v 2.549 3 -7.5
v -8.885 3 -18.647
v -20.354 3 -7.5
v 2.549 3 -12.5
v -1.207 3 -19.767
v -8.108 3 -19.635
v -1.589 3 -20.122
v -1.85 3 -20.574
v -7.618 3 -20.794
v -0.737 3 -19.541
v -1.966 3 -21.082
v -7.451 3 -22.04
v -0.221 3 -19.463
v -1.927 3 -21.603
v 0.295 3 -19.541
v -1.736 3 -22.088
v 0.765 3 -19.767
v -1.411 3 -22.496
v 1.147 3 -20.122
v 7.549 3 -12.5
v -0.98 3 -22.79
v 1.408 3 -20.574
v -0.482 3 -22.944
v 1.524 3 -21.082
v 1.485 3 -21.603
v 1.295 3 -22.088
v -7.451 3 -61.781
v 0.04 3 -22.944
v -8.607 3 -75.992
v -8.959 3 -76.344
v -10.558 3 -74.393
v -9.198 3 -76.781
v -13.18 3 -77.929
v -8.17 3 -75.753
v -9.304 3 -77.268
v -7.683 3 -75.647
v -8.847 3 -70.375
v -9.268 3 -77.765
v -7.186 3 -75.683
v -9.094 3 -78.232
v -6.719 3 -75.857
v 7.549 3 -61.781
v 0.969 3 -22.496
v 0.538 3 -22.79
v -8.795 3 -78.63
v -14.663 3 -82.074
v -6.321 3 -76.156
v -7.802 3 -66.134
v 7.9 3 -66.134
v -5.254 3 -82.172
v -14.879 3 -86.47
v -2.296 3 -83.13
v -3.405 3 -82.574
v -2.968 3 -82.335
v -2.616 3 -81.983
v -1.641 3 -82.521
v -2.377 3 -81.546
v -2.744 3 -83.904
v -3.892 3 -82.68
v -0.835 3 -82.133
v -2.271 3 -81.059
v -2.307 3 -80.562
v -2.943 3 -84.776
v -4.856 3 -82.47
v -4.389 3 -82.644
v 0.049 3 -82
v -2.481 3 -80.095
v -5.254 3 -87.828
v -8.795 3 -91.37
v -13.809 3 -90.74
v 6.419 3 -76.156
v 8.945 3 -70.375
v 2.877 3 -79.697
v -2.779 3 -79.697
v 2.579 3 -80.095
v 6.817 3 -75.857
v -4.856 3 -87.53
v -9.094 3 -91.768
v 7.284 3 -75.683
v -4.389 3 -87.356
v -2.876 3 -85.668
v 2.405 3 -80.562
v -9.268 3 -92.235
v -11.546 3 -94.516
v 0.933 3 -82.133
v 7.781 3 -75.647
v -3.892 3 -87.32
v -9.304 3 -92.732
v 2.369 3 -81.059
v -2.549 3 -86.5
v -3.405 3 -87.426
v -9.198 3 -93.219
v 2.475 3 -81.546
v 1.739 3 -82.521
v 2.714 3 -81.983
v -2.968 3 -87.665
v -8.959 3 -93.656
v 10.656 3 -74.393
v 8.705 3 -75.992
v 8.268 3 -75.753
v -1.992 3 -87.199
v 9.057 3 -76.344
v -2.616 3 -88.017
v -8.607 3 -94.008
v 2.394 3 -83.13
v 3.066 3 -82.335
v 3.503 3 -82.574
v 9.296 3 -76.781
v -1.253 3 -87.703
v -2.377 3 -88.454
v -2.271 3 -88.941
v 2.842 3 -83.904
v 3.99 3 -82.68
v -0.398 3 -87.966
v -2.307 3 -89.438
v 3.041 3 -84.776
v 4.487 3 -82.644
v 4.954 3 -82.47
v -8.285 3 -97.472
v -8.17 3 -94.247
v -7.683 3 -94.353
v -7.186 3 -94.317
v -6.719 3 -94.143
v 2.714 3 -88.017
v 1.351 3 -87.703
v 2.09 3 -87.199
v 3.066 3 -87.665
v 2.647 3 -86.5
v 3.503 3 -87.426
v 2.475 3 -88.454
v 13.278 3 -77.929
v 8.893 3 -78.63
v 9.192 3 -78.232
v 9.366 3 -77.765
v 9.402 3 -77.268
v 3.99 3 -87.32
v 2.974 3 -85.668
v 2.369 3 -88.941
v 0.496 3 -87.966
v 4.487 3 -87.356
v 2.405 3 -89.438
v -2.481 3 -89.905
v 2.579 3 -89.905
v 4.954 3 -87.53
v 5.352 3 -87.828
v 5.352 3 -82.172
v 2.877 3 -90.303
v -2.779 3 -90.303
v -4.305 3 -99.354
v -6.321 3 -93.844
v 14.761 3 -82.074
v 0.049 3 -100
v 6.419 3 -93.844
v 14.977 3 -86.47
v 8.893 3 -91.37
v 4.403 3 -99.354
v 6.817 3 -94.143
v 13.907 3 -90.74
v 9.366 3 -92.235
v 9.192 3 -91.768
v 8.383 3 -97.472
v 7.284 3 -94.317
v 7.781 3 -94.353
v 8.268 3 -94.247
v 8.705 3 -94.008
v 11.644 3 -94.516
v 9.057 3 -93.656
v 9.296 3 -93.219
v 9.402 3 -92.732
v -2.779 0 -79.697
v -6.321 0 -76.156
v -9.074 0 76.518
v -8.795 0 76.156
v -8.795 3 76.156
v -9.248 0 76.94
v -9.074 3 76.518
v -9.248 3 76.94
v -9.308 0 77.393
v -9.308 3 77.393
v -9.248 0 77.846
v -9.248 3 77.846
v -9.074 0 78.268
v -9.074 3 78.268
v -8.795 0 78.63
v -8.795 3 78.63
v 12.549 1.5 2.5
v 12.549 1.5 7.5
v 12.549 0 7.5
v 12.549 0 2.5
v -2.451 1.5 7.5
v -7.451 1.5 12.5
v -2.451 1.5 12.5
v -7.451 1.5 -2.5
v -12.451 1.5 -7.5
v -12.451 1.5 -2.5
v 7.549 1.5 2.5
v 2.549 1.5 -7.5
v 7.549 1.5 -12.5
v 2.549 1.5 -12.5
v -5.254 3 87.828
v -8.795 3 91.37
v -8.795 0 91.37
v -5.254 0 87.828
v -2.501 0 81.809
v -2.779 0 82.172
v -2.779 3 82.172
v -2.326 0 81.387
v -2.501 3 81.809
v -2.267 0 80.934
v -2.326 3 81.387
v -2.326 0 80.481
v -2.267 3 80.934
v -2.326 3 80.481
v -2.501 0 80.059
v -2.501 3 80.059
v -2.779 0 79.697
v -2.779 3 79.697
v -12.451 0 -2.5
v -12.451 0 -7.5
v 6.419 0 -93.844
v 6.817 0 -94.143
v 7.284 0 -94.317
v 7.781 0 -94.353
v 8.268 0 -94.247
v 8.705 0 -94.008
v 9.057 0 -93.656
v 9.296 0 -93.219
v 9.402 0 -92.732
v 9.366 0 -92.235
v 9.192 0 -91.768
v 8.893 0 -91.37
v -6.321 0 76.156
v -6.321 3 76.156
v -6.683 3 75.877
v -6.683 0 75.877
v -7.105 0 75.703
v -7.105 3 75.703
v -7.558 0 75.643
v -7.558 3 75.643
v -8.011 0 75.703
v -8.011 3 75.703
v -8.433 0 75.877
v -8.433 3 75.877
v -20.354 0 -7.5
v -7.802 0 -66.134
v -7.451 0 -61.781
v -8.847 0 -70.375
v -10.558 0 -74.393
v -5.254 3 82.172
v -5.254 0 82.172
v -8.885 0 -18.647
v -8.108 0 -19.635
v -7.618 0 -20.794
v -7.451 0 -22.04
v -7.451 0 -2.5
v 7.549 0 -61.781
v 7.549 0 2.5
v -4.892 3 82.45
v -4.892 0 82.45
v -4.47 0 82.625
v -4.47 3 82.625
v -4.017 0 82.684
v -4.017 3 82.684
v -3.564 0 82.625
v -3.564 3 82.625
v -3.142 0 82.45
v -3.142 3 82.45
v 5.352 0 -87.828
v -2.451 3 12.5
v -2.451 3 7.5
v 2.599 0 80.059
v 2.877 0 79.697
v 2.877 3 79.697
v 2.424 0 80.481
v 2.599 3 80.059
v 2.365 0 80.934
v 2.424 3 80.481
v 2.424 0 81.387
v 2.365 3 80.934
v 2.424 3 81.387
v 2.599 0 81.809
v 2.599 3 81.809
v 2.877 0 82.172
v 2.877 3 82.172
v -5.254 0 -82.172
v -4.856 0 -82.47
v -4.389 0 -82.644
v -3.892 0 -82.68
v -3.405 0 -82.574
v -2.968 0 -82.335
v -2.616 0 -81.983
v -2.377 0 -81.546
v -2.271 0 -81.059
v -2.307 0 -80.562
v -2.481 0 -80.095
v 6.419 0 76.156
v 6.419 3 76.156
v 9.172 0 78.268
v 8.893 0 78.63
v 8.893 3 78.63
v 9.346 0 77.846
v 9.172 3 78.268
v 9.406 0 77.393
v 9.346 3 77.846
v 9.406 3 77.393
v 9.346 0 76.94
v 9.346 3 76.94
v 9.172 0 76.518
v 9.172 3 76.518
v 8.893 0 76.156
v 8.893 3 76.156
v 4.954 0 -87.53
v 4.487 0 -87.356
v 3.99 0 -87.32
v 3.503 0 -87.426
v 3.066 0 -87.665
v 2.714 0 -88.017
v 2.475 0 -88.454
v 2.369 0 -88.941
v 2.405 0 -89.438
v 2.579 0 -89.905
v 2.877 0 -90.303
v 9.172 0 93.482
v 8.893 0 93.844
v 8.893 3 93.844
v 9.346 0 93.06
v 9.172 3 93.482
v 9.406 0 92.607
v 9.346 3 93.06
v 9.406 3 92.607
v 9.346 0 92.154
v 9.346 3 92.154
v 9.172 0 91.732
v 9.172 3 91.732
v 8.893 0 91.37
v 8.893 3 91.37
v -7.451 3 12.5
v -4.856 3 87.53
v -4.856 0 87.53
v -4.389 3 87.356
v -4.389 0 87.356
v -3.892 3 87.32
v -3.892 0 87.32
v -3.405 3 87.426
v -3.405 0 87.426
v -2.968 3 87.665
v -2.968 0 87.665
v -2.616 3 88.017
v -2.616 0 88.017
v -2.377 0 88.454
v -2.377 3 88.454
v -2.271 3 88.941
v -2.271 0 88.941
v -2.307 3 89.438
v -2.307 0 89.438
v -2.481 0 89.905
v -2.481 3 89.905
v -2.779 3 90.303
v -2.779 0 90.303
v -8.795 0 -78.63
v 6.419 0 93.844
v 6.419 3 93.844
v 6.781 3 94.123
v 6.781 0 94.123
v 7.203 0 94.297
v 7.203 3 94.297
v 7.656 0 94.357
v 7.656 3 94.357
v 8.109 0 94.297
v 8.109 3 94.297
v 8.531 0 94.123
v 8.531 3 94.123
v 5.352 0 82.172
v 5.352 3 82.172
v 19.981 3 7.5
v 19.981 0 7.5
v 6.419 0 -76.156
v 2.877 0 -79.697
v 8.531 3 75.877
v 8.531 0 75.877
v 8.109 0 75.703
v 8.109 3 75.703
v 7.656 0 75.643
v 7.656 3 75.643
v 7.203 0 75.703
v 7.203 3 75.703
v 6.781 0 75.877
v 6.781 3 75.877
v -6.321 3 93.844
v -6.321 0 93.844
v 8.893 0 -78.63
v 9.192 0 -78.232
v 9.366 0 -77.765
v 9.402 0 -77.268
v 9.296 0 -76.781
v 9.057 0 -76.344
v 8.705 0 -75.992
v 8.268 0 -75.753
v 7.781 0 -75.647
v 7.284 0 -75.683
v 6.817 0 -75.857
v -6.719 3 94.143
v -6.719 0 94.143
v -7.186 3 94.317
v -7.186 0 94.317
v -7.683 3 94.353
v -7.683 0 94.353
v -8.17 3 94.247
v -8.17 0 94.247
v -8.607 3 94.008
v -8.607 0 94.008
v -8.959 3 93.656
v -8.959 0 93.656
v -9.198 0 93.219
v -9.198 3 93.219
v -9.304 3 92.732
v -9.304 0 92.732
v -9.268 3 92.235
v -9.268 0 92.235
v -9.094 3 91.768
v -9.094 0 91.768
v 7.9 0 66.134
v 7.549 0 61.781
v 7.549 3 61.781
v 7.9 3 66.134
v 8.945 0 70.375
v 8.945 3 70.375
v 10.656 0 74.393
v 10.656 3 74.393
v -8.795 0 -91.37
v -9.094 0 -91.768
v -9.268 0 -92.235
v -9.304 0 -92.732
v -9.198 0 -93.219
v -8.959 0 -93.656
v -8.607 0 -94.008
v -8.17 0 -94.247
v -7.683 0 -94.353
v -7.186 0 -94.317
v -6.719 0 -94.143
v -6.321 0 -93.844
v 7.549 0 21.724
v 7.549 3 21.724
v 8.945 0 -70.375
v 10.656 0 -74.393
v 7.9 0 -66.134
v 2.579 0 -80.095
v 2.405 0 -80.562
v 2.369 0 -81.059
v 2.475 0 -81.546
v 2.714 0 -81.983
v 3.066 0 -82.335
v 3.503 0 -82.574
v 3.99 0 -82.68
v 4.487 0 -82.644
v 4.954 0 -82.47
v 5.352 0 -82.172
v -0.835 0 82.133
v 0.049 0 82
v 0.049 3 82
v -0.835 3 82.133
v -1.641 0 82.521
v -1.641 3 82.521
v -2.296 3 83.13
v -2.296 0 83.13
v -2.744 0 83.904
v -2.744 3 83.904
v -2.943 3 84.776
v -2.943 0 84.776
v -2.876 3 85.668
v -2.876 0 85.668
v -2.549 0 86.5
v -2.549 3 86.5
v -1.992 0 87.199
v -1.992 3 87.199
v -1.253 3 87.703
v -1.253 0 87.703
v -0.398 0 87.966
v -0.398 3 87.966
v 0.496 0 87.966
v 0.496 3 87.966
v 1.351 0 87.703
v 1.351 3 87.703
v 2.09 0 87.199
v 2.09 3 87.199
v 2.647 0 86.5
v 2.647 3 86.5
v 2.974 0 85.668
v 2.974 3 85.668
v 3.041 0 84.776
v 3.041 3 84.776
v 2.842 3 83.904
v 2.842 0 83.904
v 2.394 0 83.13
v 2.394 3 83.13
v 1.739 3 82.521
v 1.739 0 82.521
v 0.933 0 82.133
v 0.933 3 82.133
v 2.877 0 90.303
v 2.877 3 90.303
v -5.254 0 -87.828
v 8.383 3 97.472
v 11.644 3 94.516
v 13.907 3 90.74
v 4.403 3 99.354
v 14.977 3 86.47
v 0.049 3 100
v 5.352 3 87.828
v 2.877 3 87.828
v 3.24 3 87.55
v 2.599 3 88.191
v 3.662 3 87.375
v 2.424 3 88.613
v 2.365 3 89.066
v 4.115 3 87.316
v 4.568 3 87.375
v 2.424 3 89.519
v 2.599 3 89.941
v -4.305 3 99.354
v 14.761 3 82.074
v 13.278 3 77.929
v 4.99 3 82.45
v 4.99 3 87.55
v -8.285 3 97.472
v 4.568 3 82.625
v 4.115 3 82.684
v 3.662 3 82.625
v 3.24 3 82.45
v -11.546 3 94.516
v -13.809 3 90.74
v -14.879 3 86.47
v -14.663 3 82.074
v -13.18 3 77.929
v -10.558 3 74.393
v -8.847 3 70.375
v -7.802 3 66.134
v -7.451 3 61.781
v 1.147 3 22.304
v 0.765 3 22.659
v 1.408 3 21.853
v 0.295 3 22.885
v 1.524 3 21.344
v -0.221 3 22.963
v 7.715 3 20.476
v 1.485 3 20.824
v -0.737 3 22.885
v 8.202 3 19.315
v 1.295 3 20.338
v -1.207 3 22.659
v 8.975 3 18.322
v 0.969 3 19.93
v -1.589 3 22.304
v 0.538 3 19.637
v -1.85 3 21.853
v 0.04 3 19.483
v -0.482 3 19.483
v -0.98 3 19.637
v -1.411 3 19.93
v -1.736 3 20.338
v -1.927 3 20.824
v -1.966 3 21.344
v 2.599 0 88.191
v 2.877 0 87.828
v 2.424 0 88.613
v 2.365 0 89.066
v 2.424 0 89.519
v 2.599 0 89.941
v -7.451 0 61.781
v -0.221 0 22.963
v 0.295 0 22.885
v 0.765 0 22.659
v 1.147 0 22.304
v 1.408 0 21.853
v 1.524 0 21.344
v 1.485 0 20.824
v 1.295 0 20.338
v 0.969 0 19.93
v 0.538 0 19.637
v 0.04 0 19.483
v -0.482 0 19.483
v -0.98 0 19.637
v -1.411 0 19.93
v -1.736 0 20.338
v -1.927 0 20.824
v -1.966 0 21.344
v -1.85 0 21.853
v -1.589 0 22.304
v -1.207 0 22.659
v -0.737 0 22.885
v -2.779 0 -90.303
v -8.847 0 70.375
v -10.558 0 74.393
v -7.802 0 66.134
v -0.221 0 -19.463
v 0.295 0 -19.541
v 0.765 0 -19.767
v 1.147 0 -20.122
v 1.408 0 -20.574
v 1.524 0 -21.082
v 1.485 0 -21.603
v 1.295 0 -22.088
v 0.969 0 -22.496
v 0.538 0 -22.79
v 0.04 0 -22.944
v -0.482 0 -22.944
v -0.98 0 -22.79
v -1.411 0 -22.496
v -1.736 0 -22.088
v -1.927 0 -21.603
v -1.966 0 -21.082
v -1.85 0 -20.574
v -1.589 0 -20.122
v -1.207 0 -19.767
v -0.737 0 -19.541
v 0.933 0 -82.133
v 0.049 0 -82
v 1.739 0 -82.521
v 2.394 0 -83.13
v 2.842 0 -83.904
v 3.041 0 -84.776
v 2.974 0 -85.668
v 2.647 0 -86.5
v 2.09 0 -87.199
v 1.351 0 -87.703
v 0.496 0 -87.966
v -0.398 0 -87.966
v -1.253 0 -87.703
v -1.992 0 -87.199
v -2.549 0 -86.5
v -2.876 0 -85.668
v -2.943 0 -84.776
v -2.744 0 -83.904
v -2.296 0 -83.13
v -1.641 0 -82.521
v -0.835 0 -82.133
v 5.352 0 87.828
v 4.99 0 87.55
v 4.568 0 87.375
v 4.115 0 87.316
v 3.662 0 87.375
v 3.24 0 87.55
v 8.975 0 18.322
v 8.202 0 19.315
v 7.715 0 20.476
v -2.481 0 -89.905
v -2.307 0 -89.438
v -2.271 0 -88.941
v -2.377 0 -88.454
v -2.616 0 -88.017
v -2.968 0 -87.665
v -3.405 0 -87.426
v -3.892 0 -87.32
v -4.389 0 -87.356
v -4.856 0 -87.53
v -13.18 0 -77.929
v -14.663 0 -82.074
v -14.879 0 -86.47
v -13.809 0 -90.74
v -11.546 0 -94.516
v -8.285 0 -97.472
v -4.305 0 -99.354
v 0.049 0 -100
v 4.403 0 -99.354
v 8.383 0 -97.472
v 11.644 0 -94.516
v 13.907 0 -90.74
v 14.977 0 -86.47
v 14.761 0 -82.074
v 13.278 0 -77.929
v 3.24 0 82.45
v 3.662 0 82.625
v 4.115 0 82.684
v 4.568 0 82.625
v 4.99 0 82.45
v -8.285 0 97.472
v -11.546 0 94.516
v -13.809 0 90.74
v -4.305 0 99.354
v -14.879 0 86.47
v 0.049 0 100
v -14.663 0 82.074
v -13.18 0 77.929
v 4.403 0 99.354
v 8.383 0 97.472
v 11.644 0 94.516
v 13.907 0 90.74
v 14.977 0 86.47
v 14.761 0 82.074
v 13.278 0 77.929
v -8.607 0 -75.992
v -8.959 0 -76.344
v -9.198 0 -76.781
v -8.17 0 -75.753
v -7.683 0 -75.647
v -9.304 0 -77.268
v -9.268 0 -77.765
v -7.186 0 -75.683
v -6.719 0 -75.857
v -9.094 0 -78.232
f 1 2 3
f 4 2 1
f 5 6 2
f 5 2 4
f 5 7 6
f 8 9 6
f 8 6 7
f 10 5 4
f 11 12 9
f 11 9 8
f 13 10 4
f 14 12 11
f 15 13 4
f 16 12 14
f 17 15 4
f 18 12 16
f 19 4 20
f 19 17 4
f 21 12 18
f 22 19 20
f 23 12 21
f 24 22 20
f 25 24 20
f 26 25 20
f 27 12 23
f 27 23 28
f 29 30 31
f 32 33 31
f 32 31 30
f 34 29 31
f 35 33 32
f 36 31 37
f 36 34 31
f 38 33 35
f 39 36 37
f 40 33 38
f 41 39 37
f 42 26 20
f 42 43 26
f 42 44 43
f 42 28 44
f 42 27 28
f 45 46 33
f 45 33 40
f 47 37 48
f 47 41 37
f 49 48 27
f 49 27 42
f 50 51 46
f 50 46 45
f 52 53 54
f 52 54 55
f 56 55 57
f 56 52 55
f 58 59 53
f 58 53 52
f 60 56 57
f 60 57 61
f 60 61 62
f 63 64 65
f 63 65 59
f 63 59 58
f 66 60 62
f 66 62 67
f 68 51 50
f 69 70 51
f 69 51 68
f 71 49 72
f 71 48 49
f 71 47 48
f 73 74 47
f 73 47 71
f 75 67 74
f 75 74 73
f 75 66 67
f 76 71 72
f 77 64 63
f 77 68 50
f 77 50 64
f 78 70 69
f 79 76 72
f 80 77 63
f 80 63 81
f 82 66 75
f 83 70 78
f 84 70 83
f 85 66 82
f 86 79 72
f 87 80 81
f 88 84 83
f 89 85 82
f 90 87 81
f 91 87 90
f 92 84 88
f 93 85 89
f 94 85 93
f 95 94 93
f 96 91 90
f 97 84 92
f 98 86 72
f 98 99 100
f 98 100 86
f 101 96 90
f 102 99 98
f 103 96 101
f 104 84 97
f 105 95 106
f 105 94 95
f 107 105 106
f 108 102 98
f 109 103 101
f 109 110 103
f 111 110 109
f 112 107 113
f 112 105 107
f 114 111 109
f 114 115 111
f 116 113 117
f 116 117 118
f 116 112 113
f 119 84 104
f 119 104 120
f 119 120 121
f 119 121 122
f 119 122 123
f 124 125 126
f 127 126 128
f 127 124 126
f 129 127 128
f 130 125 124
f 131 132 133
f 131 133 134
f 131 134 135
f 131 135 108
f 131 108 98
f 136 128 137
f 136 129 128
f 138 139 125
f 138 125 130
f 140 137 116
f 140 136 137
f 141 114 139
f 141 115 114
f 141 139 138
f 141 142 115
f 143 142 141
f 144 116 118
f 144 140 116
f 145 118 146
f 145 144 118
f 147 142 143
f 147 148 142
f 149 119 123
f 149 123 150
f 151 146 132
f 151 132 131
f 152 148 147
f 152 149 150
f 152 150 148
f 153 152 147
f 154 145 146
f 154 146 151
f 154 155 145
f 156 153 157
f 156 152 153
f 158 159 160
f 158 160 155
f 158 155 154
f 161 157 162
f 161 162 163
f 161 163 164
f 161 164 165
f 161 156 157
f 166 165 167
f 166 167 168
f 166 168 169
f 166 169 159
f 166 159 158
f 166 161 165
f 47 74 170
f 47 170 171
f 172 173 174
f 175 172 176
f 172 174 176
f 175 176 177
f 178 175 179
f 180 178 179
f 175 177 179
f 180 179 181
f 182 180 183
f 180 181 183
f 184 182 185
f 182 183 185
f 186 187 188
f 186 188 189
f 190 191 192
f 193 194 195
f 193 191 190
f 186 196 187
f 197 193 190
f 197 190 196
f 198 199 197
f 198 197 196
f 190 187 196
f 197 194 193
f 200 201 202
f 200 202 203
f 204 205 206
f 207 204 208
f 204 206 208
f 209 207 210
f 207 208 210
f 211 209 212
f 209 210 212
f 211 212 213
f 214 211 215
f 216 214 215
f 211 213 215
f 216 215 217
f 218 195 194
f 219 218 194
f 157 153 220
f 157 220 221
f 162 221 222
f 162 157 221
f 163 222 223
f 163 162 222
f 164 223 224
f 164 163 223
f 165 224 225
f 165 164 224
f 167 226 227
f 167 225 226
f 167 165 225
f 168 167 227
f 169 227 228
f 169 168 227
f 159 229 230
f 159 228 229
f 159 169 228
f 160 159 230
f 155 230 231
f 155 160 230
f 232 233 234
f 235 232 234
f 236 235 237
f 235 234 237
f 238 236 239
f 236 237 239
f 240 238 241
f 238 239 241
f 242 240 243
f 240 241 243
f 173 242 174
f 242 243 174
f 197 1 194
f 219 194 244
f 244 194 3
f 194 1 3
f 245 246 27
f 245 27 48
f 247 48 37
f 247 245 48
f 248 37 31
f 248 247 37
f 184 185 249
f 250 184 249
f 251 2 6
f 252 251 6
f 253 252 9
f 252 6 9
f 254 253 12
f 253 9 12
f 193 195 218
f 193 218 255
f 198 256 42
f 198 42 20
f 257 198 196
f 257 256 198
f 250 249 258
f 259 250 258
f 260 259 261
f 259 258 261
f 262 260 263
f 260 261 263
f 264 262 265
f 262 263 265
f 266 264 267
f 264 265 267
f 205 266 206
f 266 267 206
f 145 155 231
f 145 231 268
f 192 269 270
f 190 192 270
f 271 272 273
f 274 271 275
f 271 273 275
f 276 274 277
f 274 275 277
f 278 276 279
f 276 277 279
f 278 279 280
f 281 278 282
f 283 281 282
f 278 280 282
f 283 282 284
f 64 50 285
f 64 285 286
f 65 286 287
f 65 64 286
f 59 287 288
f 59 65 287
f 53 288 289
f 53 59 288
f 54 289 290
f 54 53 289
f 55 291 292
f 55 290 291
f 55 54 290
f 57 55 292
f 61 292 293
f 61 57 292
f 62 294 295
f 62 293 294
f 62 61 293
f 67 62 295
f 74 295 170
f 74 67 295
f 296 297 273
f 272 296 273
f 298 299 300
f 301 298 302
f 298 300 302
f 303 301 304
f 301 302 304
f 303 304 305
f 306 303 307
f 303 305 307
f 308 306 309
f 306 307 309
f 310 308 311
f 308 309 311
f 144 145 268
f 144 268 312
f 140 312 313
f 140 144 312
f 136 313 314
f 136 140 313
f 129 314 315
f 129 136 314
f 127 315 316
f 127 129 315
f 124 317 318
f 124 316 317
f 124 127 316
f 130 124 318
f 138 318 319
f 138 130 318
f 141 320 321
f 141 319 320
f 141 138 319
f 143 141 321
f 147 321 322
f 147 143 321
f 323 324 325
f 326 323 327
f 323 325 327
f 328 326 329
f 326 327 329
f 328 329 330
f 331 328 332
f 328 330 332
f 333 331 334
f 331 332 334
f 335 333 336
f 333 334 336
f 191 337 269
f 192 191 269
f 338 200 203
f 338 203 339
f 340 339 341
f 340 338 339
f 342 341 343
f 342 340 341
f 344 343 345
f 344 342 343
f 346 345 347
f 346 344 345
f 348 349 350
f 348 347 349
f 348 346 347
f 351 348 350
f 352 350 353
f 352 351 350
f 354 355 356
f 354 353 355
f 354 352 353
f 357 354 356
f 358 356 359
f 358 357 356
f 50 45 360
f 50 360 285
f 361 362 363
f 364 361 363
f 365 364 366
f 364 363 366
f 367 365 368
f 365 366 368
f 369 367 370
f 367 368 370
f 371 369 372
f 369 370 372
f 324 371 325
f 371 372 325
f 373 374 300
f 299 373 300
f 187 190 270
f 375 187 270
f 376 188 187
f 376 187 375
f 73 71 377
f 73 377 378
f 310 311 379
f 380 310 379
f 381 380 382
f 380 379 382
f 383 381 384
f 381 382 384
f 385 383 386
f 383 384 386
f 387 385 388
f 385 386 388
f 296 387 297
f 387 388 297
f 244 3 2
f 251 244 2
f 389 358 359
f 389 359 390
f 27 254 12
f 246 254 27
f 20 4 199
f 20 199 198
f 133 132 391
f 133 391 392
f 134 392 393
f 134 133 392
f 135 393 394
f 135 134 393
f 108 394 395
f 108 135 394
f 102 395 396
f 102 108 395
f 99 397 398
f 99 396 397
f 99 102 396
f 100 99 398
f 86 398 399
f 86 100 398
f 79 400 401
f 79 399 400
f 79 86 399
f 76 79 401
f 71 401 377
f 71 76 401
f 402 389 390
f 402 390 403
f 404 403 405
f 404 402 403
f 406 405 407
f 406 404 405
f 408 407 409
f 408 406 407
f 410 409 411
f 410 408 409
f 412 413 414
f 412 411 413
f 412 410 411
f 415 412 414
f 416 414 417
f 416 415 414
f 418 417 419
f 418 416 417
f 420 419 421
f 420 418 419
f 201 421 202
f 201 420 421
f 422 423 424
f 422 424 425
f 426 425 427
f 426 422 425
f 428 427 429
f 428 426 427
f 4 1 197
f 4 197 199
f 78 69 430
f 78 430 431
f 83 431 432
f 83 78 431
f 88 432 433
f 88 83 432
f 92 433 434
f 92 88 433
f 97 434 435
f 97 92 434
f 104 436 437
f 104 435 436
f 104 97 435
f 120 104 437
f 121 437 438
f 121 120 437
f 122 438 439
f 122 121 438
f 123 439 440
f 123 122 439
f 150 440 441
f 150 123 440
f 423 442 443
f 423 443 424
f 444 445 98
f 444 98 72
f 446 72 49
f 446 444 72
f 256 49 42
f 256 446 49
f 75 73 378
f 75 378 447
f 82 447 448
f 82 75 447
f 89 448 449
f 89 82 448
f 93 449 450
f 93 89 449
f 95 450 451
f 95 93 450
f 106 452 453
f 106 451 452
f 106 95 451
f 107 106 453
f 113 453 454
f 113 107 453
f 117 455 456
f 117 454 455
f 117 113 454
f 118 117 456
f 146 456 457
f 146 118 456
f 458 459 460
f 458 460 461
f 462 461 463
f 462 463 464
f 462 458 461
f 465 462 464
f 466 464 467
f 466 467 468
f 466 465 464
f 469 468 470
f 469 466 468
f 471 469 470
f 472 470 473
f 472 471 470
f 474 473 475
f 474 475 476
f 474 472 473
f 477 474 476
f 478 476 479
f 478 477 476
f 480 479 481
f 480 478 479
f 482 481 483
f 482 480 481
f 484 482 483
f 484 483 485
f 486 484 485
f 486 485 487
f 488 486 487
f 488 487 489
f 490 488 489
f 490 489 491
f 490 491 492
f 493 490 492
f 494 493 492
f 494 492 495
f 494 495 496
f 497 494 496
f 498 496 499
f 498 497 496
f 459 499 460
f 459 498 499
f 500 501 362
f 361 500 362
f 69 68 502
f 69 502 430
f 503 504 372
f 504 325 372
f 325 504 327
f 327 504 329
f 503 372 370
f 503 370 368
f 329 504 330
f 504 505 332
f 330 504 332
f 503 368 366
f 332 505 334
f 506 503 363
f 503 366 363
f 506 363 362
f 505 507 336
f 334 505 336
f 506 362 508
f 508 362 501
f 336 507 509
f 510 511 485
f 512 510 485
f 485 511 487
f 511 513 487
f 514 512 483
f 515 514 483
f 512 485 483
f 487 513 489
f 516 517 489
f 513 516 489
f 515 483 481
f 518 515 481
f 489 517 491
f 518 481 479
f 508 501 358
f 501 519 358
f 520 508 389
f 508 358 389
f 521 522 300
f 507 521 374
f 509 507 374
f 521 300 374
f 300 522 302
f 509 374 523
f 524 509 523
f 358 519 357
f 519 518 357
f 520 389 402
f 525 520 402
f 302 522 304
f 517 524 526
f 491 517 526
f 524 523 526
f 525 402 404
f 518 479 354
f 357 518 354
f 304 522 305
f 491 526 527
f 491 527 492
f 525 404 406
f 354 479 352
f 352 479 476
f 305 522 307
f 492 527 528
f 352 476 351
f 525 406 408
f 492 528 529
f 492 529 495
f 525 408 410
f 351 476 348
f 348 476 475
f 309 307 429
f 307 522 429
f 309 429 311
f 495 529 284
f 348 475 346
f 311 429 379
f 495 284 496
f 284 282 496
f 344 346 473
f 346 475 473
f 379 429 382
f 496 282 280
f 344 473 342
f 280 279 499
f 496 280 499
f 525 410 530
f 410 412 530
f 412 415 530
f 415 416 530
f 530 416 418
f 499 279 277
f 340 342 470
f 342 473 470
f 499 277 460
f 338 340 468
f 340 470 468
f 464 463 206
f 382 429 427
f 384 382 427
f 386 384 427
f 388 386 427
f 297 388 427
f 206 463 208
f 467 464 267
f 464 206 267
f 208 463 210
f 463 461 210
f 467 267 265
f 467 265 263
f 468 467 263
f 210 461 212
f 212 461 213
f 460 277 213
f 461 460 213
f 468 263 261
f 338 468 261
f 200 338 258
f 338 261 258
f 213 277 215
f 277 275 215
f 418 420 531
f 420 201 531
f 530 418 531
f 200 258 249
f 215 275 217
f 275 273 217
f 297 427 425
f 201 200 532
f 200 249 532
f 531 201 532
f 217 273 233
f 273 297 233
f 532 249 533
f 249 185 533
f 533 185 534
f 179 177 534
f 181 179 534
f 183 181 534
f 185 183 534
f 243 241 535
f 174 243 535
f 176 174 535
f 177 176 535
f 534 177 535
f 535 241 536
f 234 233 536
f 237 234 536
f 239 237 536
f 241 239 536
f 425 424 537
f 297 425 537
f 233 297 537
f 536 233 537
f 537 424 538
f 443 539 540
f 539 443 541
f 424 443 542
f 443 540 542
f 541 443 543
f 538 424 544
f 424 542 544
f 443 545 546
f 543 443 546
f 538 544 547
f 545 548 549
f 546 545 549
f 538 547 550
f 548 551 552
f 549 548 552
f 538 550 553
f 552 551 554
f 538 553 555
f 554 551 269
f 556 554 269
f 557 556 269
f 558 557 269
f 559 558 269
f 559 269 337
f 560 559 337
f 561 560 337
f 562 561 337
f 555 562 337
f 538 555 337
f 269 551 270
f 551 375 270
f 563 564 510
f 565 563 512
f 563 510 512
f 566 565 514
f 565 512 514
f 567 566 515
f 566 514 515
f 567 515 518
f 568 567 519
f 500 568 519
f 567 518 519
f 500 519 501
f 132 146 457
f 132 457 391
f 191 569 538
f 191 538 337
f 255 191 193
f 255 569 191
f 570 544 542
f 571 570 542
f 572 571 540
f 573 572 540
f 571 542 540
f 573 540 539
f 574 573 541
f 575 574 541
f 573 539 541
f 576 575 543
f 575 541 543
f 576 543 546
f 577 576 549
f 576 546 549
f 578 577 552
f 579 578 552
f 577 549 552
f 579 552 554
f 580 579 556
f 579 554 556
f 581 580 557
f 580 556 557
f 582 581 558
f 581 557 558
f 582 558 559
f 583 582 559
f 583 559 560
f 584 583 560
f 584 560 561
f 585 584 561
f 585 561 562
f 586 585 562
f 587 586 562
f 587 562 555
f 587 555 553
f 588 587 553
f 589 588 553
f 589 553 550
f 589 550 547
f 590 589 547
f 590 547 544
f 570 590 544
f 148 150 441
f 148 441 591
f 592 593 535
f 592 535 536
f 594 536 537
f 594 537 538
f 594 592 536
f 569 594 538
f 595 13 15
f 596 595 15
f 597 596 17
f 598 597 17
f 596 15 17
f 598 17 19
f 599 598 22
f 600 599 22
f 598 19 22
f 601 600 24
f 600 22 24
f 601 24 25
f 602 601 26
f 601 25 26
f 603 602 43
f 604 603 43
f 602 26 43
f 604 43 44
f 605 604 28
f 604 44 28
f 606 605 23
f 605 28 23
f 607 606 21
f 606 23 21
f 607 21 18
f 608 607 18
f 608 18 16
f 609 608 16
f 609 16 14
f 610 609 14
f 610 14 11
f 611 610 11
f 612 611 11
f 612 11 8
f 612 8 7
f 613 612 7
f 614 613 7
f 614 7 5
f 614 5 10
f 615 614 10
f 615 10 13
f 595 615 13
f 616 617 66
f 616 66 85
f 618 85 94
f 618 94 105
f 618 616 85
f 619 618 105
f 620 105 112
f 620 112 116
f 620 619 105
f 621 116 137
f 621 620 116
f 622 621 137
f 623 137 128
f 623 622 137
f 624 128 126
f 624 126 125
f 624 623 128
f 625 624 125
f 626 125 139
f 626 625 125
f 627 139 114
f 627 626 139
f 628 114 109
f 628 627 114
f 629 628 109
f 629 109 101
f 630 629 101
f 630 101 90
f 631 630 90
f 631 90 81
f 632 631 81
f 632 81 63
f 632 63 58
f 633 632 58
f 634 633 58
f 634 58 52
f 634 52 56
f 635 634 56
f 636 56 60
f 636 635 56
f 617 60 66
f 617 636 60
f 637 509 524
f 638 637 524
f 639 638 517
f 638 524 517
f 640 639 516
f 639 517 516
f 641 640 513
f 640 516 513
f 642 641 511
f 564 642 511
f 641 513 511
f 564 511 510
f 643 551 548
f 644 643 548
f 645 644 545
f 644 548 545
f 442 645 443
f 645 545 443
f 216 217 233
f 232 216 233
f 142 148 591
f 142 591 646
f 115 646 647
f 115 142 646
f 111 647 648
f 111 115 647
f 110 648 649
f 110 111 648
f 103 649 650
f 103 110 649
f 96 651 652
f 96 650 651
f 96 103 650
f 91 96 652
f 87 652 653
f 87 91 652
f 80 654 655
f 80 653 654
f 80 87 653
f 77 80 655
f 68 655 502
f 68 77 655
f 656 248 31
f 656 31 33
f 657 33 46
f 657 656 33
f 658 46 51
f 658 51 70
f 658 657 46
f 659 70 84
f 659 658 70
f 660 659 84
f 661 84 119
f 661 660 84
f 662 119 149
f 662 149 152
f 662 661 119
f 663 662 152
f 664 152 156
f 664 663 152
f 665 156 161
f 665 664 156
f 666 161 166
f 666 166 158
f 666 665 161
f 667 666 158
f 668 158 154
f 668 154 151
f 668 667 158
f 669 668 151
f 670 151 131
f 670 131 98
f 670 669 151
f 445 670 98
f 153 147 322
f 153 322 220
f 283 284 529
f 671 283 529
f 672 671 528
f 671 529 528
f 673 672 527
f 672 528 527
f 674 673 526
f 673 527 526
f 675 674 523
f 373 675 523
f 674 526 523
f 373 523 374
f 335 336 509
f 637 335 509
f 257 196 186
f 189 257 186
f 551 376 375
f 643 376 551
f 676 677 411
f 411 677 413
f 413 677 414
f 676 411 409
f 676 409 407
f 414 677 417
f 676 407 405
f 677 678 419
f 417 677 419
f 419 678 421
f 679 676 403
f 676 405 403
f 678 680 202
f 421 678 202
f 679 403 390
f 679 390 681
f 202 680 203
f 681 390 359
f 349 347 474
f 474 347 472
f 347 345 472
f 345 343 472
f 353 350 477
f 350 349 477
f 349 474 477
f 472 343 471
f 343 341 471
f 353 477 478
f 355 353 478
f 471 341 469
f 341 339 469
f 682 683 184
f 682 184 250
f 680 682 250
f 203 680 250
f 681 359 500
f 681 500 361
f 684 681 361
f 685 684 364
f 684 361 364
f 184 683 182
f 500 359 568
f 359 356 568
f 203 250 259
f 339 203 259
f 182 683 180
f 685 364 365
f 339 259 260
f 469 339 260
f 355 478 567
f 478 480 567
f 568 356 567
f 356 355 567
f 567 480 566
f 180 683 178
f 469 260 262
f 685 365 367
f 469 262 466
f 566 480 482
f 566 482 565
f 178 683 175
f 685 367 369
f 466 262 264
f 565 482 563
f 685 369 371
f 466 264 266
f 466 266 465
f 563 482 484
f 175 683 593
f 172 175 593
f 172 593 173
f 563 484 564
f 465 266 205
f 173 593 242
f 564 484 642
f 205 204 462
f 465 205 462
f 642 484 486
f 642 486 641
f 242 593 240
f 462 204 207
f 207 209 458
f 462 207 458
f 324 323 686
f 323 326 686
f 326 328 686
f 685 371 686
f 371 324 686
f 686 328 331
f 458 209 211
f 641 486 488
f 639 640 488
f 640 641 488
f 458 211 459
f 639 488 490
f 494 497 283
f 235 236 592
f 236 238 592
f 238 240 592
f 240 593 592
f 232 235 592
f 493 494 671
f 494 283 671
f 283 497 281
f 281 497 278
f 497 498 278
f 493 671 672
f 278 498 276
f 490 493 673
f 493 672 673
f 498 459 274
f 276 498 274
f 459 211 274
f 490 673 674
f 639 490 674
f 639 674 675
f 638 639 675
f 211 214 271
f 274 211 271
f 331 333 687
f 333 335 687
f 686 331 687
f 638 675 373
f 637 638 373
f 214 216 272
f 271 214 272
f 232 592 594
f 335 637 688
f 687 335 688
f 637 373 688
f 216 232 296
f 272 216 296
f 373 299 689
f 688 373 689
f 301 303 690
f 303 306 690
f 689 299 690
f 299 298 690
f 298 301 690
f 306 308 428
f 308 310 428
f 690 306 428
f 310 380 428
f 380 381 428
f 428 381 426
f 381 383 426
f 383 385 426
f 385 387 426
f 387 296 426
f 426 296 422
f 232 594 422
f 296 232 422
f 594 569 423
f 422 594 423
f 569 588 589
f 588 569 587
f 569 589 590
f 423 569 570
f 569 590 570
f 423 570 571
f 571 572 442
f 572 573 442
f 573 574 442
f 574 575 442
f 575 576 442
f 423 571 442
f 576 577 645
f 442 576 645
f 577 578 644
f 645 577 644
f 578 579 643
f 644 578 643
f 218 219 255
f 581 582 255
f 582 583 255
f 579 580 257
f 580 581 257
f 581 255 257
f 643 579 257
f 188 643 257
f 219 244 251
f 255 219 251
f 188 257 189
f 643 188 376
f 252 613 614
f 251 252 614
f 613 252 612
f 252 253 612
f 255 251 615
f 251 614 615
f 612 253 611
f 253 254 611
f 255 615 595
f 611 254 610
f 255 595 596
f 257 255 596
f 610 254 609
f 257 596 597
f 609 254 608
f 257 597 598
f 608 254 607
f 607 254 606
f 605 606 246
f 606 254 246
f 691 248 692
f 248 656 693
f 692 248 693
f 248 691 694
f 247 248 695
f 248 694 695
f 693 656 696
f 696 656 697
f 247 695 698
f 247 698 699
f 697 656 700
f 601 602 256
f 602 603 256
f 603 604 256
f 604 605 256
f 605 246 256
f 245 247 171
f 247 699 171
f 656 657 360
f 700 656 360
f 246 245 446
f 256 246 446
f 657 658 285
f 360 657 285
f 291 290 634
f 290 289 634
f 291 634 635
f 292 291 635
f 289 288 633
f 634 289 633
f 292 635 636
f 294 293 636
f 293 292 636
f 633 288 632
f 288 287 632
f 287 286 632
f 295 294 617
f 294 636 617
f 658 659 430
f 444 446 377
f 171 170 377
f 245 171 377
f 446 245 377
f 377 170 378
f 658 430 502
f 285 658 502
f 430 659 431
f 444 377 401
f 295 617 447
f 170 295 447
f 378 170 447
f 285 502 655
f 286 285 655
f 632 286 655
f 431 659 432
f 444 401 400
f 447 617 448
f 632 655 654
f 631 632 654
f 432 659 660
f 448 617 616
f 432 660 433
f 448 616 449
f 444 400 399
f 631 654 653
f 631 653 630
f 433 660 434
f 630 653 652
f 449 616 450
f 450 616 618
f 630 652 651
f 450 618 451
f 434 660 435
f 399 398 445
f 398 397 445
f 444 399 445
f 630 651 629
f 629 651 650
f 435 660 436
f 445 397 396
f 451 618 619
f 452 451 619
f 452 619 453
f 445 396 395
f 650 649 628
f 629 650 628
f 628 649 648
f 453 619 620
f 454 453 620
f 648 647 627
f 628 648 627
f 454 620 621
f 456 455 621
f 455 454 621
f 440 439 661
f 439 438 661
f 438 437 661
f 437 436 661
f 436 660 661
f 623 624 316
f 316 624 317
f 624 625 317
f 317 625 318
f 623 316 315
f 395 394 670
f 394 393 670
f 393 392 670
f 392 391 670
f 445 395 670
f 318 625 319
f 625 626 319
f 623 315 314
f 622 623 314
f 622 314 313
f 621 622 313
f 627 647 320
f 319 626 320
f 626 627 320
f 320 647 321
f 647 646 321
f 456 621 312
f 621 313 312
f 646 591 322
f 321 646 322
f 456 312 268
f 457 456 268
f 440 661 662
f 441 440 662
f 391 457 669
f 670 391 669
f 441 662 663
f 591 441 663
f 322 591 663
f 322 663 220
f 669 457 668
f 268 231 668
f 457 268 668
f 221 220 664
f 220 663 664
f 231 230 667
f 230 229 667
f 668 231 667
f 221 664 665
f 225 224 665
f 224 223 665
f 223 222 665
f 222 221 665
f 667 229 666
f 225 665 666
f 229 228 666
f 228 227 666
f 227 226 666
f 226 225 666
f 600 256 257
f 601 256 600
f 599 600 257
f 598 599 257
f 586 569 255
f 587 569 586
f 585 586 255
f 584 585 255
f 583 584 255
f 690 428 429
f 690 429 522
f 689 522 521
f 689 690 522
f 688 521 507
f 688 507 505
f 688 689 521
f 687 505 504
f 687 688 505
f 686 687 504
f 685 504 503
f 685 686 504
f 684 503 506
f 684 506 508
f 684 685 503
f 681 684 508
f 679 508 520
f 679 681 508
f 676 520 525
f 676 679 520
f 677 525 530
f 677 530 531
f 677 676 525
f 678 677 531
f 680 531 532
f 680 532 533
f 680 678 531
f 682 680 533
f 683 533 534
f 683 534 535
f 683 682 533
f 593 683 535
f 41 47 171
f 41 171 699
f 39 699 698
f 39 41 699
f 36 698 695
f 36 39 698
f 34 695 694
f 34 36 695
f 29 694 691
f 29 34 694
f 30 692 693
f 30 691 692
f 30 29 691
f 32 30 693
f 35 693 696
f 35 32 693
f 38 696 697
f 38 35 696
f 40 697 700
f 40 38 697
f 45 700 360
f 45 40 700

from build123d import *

# Parameters (mm, degrees)
SKETCH1_R            = 3
SKETCH1_R_2          = 1.75
SKETCH1_R_3          = 1.5
BOSS_EXTRUDE2_DEPTH  = 3
SKETCH3_W            = 15.09800494
SKETCH3_H            = 15
CUT_EXTRUDE1_DEPTH   = 1.5
BOSS_EXTRUDE5_DEPTH  = 1.5
SKETCH5_W            = 5
SKETCH5_H            = 5
CUT_EXTRUDE2_DEPTH   = 1.5
BOSS_EXTRUDE7_DEPTH  = 3
SKETCH11_W           = 5
SKETCH11_H           = 5
BOSS_EXTRUDE11_DEPTH = 1.5
BOSS_EXTRUDE13_START = -3
SKETCH13_R           = 1.5
BOSS_EXTRUDE13_DEPTH = 3
SKETCH14_R           = 1.5
CUT_EXTRUDE6_DEPTH   = 103.094396255
SKETCH15_R           = 1.75
BOSS_EXTRUDE14_DEPTH = 3
SKETCH16_R           = 1.75
CUT_EXTRUDE7_DEPTH   = 103.094396255
SKETCH17_R           = 2.254560192
SKETCH17_R_2         = 2.966312922
SKETCH17_R_3         = 2.636452531
SKETCH17_R_4         = 1.99649084
SKETCH17_R_5         = 2.524996951
SKETCH17_R_6         = 3.313056584
SKETCH17_R_7         = 2.262213741
SKETCH17_R_8         = 2.353292134
BOSS_EXTRUDE15_DEPTH = 3
SKETCH19_R           = 1.75
CUT_EXTRUDE10_DEPTH  = 10
CUT_EXTRUDE11_DEPTH  = 10


with BuildPart() as part:
    # Sketch1 → Boss-Extrude2 (new body)
    with BuildSketch(Plane(origin=(0, 0, 0), x_dir=(1, 0, 0), z_dir=(0, 1, 0))):
        with BuildLine():
            Line((-7.45099753, -61.780902979), (-7.45099753, 61.780902979))
            ThreePointArc((-7.45099753, 61.780902979), (-8.239083338, 68.275631842), (-10.557599248, 74.393398282))
            ThreePointArc((-10.557599248, 74.393398282), (0.04900247, 100), (10.655604188, 74.393398282))
            ThreePointArc((10.655604188, 74.393398282), (8.337088278, 68.275631842), (7.54900247, 61.780902979))
            Line((7.54900247, 61.780902979), (7.54900247, -61.780902979))
            ThreePointArc((7.54900247, -61.780902979), (8.337088278, -68.275631842), (10.655604188, -74.393398282))
            ThreePointArc((10.655604188, -74.393398282), (0.04900247, -100), (-10.557599248, -74.393398282))
            ThreePointArc((-10.557599248, -74.393398282), (-8.239083338, -68.275631842), (-7.45099753, -61.780902979))
        make_face()
        with Locations(Location((0.04900247, 85, 0), (0, 0, 270))):
            Circle(SKETCH1_R, mode=Mode.SUBTRACT)
        with Locations(Location((-6.668511951, 91.717514421, 0), (0, 0, 270))):
            Circle(SKETCH1_R_2, mode=Mode.SUBTRACT)
        with Locations(Location((-5.607851779, 79.343145751, 0), (0, 0, 270))):
            Circle(SKETCH1_R_2, mode=Mode.SUBTRACT)
        with Locations(Location((5.70585672, 90.656854249, 0), (0, 0, 270))):
            Circle(SKETCH1_R_2, mode=Mode.SUBTRACT)
        with Locations(Location((6.766516891, 78.282485579, 0), (0, 0, 270))):
            Circle(SKETCH1_R_2, mode=Mode.SUBTRACT)
        with Locations(Location((0, 20, 0), (0, 0, 270))):
            Circle(SKETCH1_R_3, mode=Mode.SUBTRACT)
        with Locations(Location((5.70585672, -90.656854249, 0), (0, 0, 90))):
            Circle(SKETCH1_R_2, mode=Mode.SUBTRACT)
        with Locations(Location((-6.668511951, -91.717514421, 0), (0, 0, 90))):
            Circle(SKETCH1_R_2, mode=Mode.SUBTRACT)
        with Locations(Location((0.04900247, -85, 0), (0, 0, 90))):
            Circle(SKETCH1_R, mode=Mode.SUBTRACT)
        with Locations(Location((6.766516891, -78.282485579, 0), (0, 0, 90))):
            Circle(SKETCH1_R_2, mode=Mode.SUBTRACT)
        with Locations(Location((-5.607851779, -79.343145751, 0), (0, 0, 90))):
            Circle(SKETCH1_R_2, mode=Mode.SUBTRACT)
        with Locations(Location((0, -20, 0), (0, 0, 90))):
            Circle(SKETCH1_R_3, mode=Mode.SUBTRACT)
    extrude(amount=BOSS_EXTRUDE2_DEPTH)

    # Sketch3 → Cut-Extrude1 (cut)
    with BuildSketch(Plane(origin=(0, 3, 0), x_dir=(1, 0, 0), z_dir=(0, 1, 0))):
        Rectangle(SKETCH3_W, SKETCH3_H)
    extrude(amount=-CUT_EXTRUDE1_DEPTH, mode=Mode.SUBTRACT)

    # Sketch4 → Boss-Extrude5 (add, symmetric)
    with BuildSketch(Plane(origin=(0, 1.5, 0), x_dir=(1, 0, 0), z_dir=(0, 1, 0))):
        Polygon((7.54900247, -7.5), (19.98054828, -7.5), (7.54900247, -19.723921291), align=None)
        Polygon((-7.208608823, 7.5), (-20.353519271, 7.5), (-7.208608823, 20.276078709), align=None)
    extrude(amount=BOSS_EXTRUDE5_DEPTH, both=True)

    # Sketch5 → Cut-Extrude2 (cut)
    with BuildSketch(Plane(origin=(0, 3, 0), x_dir=(1, 0, 0), z_dir=(0, 1, 0))):
        with Locations((5.04900247, 10)):
            Rectangle(SKETCH5_W, SKETCH5_H)
        with Locations((-4.95099753, -10)):
            Rectangle(SKETCH5_W, SKETCH5_H)
    extrude(amount=-CUT_EXTRUDE2_DEPTH, mode=Mode.SUBTRACT)

    # Sketch6 → Boss-Extrude7 (add)
    with BuildSketch(Plane(origin=(0, 3, 0), x_dir=(1, 0, 0), z_dir=(0, 1, 0))):
        with BuildLine():
            Line((7.54900247, -19.723921291), (8.975074609, -18.321666587))
            ThreePointArc((8.975074609, -18.321666587), (7.919938782, -19.879401108), (7.54900247, -21.723921291))
            Line((7.54900247, -21.723921291), (7.54900247, -19.723921291))
        make_face()
        with BuildLine():
            Line((-7.45099753, 20.040491163), (-8.885188865, 18.646541661))
            ThreePointArc((-8.885188865, 18.646541661), (-7.824264446, 20.198223674), (-7.45099753, 22.040491163))
            Line((-7.45099753, 22.040491163), (-7.45099753, 20.040491163))
        make_face()
    extrude(amount=-BOSS_EXTRUDE7_DEPTH)

    # Sketch11 → Boss-Extrude11 (add)
    with BuildSketch(Plane(origin=(0, 1.5, 0), x_dir=(1, 0, 0), z_dir=(0, 1, 0))):
        with Locations((10.04900247, -5)):
            Rectangle(SKETCH11_W, SKETCH11_H)
        with Locations((-9.95099753, 5)):
            Rectangle(SKETCH11_W, SKETCH11_H)
    extrude(amount=-BOSS_EXTRUDE11_DEPTH)

    # Sketch13 → Boss-Extrude13 (add)
    with BuildSketch(Plane(origin=(0, 3, 0), x_dir=(1, 0, 0), z_dir=(0, 1, 0)).offset(BOSS_EXTRUDE13_START)):
        with Locations((0, -20)):
            Circle(SKETCH13_R)
        with Locations((0, 20)):
            Circle(SKETCH13_R)
    extrude(amount=BOSS_EXTRUDE13_DEPTH)

    # Sketch14 → Cut-Extrude6 (cut, through all)
    with BuildSketch(Plane(origin=(0, 3, 0), x_dir=(1, 0, 0), z_dir=(0, 1, 0))):
        with Locations(Location((-0.220863586, -21.21320344, 0), (0, 0, 270))):
            Circle(SKETCH14_R)
        with Locations(Location((-0.220863586, 21.2132, 0), (0, 0, 270))):
            Circle(SKETCH14_R)
    extrude(amount=-CUT_EXTRUDE6_DEPTH, mode=Mode.SUBTRACT)

    # Sketch15 → Boss-Extrude14 (add, through all)
    with BuildSketch(Plane(origin=(0, 3, 0), x_dir=(1, 0, 0), z_dir=(0, 1, 0))):
        with Locations((-5.607851779, 79.343145751)):
            Circle(SKETCH15_R)
        with Locations((6.766516891, 78.282485579)):
            Circle(SKETCH15_R)
        with Locations((-6.668511951, 91.717514421)):
            Circle(SKETCH15_R)
        with Locations((5.70585672, 90.656854249)):
            Circle(SKETCH15_R)
    extrude(amount=-BOSS_EXTRUDE14_DEPTH)

    # Sketch16 → Cut-Extrude7 (cut, through all)
    with BuildSketch(Plane(origin=(0, 3, 0), x_dir=(1, 0, 0), z_dir=(0, 1, 0))):
        with Locations(Location((-6.668511951, 78.282485579, 0), (0, 0, 270))):
            Circle(SKETCH16_R)
        with Locations(Location((5.70585672, 79.343145751, 0), (0, 0, 270))):
            Circle(SKETCH16_R)
        with Locations(Location((6.766516891, 91.717514421, 0), (0, 0, 270))):
            Circle(SKETCH16_R)
        with Locations(Location((-5.610118231, 90.659120701, 0), (0, 0, 270))):
            Circle(SKETCH16_R)
    extrude(amount=-CUT_EXTRUDE7_DEPTH, mode=Mode.SUBTRACT)

    # Sketch17 → Boss-Extrude15 (add)
    with BuildSketch(Plane(origin=(0, 3, 0), x_dir=(1, 0, 0), z_dir=(0, 1, 0))):
        with Locations((5.70585672, 79.343145751)):
            Circle(SKETCH17_R)
        with Locations((-6.668511951, 78.282485579)):
            Circle(SKETCH17_R_2)
        with Locations((-5.610118231, 90.659120701)):
            Circle(SKETCH17_R_3)
        with Locations((6.766516891, 91.717514421)):
            Circle(SKETCH17_R_4)
        with Locations((-6.668511951, -91.717514421)):
            Circle(SKETCH17_R_5)
        with Locations((-5.607851779, -79.343145751)):
            Circle(SKETCH17_R_6)
        with Locations((6.766516891, -78.282485579)):
            Circle(SKETCH17_R_7)
        with Locations((5.70585672, -90.656854249)):
            Circle(SKETCH17_R_8)
    extrude(amount=-BOSS_EXTRUDE15_DEPTH)

    # Sketch19 → Cut-Extrude10 (cut)
    with BuildSketch(Plane(origin=(0, 3, 0), x_dir=(1, 0, 0), z_dir=(0, 1, 0))):
        with Locations(Location((-0.220863586, -21.21320344, 0), (0, 0, 270))):
            Circle(SKETCH19_R)
        with Locations(Location((-0.220863586, 21.2132, 0), (0, 0, 270))):
            Circle(SKETCH19_R)
    extrude(amount=-CUT_EXTRUDE10_DEPTH, mode=Mode.SUBTRACT)

    # Sketch18 → Cut-Extrude11 (cut)
    with BuildSketch(Plane(origin=(0, 3, 0), x_dir=(1, 0, 0), z_dir=(0, 1, 0))):
        with BuildLine():
            Line((8.893452608, -93.844450138), (2.877429595, -87.828427125))
            ThreePointArc((2.877429595, -87.828427125), (2.364866462, -89.065863992), (2.877429595, -90.303300859))
            Line((2.877429595, -90.303300859), (6.418578874, -93.844450138))
            ThreePointArc((6.418578874, -93.844450138), (7.656015741, -94.357013271), (8.893452608, -93.844450138))
        make_face()
        with BuildLine():
            ThreePointArc((5.352303329, -87.828427125), (4.114866462, -87.315863992), (2.877429595, -87.828427125))
            Line((2.877429595, -87.828427125), (8.893452608, -93.844450138))
            ThreePointArc((8.893452608, -93.844450138), (9.406015741, -92.607013271), (8.893452608, -91.369576404))
            Line((8.893452608, -91.369576404), (5.352303329, -87.828427125))
        make_face()
        with BuildLine():
            Line((8.893452608, -76.155549862), (2.877429595, -82.171572875))
            ThreePointArc((2.877429595, -82.171572875), (4.114866462, -82.684136008), (5.352303329, -82.171572875))
            Line((5.352303329, -82.171572875), (8.893452608, -78.630423596))
            ThreePointArc((8.893452608, -78.630423596), (9.406015741, -77.392986729), (8.893452608, -76.155549862))
        make_face()
        with BuildLine():
            ThreePointArc((2.877429595, -79.696699141), (2.364866462, -80.934136008), (2.877429595, -82.171572875))
            Line((2.877429595, -82.171572875), (8.893452608, -76.155549862))
            ThreePointArc((8.893452608, -76.155549862), (7.656015741, -75.642986729), (6.418578874, -76.155549862))
            Line((6.418578874, -76.155549862), (2.877429595, -79.696699141))
        make_face()
        with BuildLine():
            Line((-8.795447668, -91.369576404), (-5.254298389, -87.828427125))
            ThreePointArc((-5.254298389, -87.828427125), (-2.779424655, -87.828427125), (-2.779424655, -90.303300859))
            Line((-2.779424655, -90.303300859), (-6.320573934, -93.844450138))
            ThreePointArc((-6.320573934, -93.844450138), (-8.795447668, -93.844450138), (-8.795447668, -91.369576404))
        make_face()
        with BuildLine():
            ThreePointArc((-5.254298389, -82.171572875), (-4.016861522, -82.684136008), (-2.779424655, -82.171572875))
            Line((-2.779424655, -82.171572875), (-8.795447668, -76.155549862))
            ThreePointArc((-8.795447668, -76.155549862), (-9.308010801, -77.392986729), (-8.795447668, -78.630423596))
            Line((-8.795447668, -78.630423596), (-5.254298389, -82.171572875))
        make_face()
        with BuildLine():
            Line((-8.795447668, -76.155549862), (-2.779424655, -82.171572875))
            ThreePointArc((-2.779424655, -82.171572875), (-2.266861522, -80.934136008), (-2.779424655, -79.696699141))
            Line((-2.779424655, -79.696699141), (-6.320573934, -76.155549862))
            ThreePointArc((-6.320573934, -76.155549862), (-7.558010801, -75.642986729), (-8.795447668, -76.155549862))
        make_face()
        with BuildLine():
            ThreePointArc((-2.779424655, 90.303300859), (-2.779424655, 87.828427125), (-5.254298389, 87.828427125))
            Line((-5.254298389, 87.828427125), (-8.795447668, 91.369576404))
            ThreePointArc((-8.795447668, 91.369576404), (-8.795447668, 93.844450138), (-6.320573934, 93.844450138))
            Line((-6.320573934, 93.844450138), (-2.779424655, 90.303300859))
        make_face()
        with BuildLine():
            Line((8.893452608, 91.369576404), (5.352303329, 87.828427125))
            ThreePointArc((5.352303329, 87.828427125), (2.877429595, 87.828427125), (2.877429595, 90.303300859))
            Line((2.877429595, 90.303300859), (6.418578874, 93.844450138))
            ThreePointArc((6.418578874, 93.844450138), (8.893452608, 93.844450138), (8.893452608, 91.369576404))
        make_face()
        with BuildLine():
            ThreePointArc((2.877429595, 79.696699141), (2.877429595, 82.171572875), (5.352303329, 82.171572875))
            Line((5.352303329, 82.171572875), (8.893452608, 78.630423596))
            ThreePointArc((8.893452608, 78.630423596), (8.893452608, 76.155549862), (6.418578874, 76.155549862))
            Line((6.418578874, 76.155549862), (2.877429595, 79.696699141))
        make_face()
        with BuildLine():
            Line((-8.795447668, 78.630423596), (-5.254298389, 82.171572875))
            ThreePointArc((-5.254298389, 82.171572875), (-2.779424655, 82.171572875), (-2.779424655, 79.696699141))
            Line((-2.779424655, 79.696699141), (-6.320573934, 76.155549862))
            ThreePointArc((-6.320573934, 76.155549862), (-8.795447668, 76.155549862), (-8.795447668, 78.630423596))
        make_face()
    extrude(amount=-CUT_EXTRUDE11_DEPTH, mode=Mode.SUBTRACT)


solid = part.part
